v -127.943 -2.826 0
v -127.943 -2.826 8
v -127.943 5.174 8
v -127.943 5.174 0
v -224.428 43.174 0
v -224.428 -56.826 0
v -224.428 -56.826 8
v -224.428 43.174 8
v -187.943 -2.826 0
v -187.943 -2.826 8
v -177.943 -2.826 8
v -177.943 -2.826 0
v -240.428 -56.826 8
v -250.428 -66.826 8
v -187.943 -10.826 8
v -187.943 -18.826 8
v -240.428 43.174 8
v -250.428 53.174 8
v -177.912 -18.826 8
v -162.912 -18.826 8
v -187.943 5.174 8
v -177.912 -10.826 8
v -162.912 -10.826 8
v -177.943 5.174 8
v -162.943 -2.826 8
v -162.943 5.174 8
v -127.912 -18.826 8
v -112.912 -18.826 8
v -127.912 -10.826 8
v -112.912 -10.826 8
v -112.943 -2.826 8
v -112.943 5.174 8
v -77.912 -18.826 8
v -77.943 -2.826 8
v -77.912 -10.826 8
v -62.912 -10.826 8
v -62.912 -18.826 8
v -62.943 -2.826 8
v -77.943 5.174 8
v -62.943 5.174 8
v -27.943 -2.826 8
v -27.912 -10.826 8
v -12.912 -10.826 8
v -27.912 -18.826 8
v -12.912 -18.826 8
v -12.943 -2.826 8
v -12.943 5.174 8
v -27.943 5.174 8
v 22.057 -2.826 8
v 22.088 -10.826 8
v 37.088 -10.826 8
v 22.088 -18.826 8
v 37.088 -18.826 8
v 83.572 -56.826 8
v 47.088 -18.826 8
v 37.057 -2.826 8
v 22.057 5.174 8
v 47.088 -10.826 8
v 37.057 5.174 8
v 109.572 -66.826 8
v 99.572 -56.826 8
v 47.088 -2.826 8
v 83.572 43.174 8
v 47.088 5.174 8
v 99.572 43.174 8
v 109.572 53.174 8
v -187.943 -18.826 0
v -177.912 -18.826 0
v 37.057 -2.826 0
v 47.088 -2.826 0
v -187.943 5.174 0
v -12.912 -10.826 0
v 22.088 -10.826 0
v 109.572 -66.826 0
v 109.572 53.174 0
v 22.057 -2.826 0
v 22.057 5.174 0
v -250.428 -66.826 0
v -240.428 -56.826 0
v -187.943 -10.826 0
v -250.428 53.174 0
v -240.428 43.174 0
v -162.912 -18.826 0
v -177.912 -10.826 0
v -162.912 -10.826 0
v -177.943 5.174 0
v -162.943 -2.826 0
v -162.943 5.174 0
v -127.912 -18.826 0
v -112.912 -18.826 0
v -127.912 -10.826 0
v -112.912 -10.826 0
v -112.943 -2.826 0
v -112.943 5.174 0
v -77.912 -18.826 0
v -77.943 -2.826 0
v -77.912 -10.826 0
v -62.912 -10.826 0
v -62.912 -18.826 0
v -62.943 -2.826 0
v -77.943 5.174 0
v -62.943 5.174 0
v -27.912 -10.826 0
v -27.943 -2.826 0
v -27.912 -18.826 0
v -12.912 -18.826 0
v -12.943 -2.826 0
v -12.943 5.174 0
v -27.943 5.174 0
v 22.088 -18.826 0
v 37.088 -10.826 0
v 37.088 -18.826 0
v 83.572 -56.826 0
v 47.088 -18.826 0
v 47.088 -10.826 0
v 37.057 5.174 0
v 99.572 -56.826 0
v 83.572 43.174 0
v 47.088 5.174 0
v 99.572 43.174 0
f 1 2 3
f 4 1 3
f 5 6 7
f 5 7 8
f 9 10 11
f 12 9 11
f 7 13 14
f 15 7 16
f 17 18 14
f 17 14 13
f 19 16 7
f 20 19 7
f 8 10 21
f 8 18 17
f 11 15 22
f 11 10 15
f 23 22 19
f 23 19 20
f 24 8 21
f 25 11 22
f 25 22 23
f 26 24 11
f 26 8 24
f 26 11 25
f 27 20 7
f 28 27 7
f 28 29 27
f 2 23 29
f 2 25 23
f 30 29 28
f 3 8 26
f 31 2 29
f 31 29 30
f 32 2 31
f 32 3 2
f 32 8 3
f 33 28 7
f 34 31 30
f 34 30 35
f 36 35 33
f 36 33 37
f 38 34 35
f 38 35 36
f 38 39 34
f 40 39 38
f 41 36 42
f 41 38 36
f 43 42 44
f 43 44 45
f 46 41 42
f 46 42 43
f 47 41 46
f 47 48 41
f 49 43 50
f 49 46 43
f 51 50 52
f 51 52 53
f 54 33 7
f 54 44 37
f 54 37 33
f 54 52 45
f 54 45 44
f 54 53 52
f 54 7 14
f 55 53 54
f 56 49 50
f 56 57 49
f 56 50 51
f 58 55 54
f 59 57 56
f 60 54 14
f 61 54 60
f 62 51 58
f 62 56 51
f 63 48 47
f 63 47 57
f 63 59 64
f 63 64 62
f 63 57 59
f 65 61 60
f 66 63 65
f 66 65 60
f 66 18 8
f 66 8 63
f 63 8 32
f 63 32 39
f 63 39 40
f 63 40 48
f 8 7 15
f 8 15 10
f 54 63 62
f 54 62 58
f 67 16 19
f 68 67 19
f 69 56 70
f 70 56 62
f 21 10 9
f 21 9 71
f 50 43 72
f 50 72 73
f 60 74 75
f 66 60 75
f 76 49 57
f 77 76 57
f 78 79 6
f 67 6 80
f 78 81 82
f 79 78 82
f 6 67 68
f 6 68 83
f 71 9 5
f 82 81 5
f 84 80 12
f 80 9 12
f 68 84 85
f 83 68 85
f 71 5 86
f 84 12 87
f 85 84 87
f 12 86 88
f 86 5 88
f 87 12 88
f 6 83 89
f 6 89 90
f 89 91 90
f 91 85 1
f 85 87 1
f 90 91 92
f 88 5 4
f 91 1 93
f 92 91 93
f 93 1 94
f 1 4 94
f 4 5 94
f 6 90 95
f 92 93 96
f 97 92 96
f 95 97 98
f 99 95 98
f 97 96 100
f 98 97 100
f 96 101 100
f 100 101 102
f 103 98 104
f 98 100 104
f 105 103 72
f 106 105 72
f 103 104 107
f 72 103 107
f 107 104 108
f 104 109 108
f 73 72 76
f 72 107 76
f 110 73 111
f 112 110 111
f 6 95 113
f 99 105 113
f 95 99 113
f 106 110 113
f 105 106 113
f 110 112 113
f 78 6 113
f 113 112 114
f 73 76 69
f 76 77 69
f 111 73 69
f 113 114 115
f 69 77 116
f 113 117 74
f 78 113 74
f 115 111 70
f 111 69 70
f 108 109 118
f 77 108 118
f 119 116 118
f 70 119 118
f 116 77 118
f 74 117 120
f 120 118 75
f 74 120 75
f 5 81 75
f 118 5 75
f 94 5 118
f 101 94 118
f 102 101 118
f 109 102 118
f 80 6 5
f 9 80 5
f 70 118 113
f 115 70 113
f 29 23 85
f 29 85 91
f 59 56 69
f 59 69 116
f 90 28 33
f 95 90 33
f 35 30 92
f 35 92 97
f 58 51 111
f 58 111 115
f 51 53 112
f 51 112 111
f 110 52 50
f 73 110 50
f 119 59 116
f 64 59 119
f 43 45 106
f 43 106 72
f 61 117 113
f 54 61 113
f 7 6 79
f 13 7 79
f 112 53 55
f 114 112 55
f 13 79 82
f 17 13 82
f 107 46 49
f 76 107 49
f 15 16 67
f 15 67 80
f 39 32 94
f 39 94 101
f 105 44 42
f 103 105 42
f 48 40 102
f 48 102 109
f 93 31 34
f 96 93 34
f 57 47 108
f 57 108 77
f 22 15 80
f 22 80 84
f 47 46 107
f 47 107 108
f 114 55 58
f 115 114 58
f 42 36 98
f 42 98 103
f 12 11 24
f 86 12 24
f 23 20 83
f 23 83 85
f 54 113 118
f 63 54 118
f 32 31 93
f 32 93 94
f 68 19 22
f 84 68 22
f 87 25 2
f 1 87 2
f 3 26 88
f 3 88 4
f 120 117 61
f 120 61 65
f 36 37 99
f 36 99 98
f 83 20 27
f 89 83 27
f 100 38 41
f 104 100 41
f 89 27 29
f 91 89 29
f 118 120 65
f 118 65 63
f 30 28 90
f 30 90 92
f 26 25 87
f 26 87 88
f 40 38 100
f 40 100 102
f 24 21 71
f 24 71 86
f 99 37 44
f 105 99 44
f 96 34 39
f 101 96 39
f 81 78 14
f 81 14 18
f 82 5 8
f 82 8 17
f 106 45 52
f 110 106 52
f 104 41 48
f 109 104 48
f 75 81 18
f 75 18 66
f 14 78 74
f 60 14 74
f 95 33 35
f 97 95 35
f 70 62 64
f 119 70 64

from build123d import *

# Parameters (mm, degrees)
IZIM1_W                     = 360
IZIM1_H                     = 120
IZIM1_W_2                   = 302.16
IZIM1_H_2                   = 8
Y_KSEKLIK_EKSTR_ZYON1_DEPTH = 8
IZIM4_W                     = 16
IZIM4_H                     = 100
KES_EKSTR_ZYON3_DEPTH       = 10
IZIM5_W                     = 35
IZIM5_H                     = 8
IZIM5_W_2                   = 10.030547984
IZIM5_W_3                   = 10
KES_EKSTR_ZYON4_DEPTH       = 8


with BuildPart() as part:
    # Çizim1 → Yükseklik-Ekstrüzyon1 (new body)
    # profile 1 of 3: a face of its own
    with BuildSketch(Plane.XY):
        with Locations((-70.427590571, -6.826190476)):
            Rectangle(IZIM1_W, IZIM1_H)
        with Locations((-70.427590571, 1.173809524)):
            Rectangle(IZIM1_W_2, IZIM1_H_2, mode=Mode.SUBTRACT)
        with Locations((-70.427590571, -14.826190476)):
            Rectangle(IZIM1_W_2, IZIM1_H_2, mode=Mode.SUBTRACT)
    # profile 2 of 3: a face of its own
    with BuildSketch(Plane.XY):
        with Locations((-70.427590571, -14.826190476)):
            Rectangle(IZIM1_W_2, IZIM1_H_2)
    # profile 3 of 3: a face of its own
    with BuildSketch(Plane.XY):
        with Locations((-70.427590571, 1.173809524)):
            Rectangle(IZIM1_W_2, IZIM1_H_2)
    extrude(amount=Y_KSEKLIK_EKSTR_ZYON1_DEPTH)

    # Çizim4 → Kes-Ekstrüzyon3 (cut)
    with BuildSketch(Plane(origin=(0, 0, 0), x_dir=(-1, 0, 0), z_dir=(0, 0, -1))):
        with Locations((232.427590571, -6.826190476)):
            Rectangle(IZIM4_W, IZIM4_H)
        with Locations((-91.572409429, -6.826190476)):
            Rectangle(IZIM4_W, IZIM4_H)
    extrude(amount=-KES_EKSTR_ZYON3_DEPTH, mode=Mode.SUBTRACT)

    # Çizim5 → Kes-Ekstrüzyon4 (cut)
    with BuildSketch(Plane.XY.offset(8)):
        with Locations((-145.442864563, 1.173809524)):
            Rectangle(IZIM5_W, IZIM5_H)
        with Locations((-145.412316579, -14.826190476)):
            Rectangle(IZIM5_W, IZIM5_H)
        with Locations((-182.927590571, -14.826190476)):
            Rectangle(IZIM5_W_2, IZIM5_H)
        with Locations((-182.942864563, 1.173809524)):
            Rectangle(IZIM5_W_3, IZIM5_H)
        with Locations((-95.412316579, -14.826190476)):
            Rectangle(IZIM5_W, IZIM5_H)
        with Locations((-95.442864563, 1.173809524)):
            Rectangle(IZIM5_W, IZIM5_H)
        with Locations((-45.412316579, -14.826190476)):
            Rectangle(IZIM5_W, IZIM5_H)
        with Locations((-45.442864563, 1.173809524)):
            Rectangle(IZIM5_W, IZIM5_H)
        with Locations((4.587683421, -14.826190476)):
            Rectangle(IZIM5_W, IZIM5_H)
        with Locations((4.557135437, 1.173809524)):
            Rectangle(IZIM5_W, IZIM5_H)
        with Locations((42.087683421, -14.826190476)):
            Rectangle(IZIM5_W_3, IZIM5_H)
        with Locations((42.072409429, 1.173809524)):
            Rectangle(IZIM5_W_2, IZIM5_H)
    extrude(amount=-KES_EKSTR_ZYON4_DEPTH, mode=Mode.SUBTRACT)


solid = part.part
